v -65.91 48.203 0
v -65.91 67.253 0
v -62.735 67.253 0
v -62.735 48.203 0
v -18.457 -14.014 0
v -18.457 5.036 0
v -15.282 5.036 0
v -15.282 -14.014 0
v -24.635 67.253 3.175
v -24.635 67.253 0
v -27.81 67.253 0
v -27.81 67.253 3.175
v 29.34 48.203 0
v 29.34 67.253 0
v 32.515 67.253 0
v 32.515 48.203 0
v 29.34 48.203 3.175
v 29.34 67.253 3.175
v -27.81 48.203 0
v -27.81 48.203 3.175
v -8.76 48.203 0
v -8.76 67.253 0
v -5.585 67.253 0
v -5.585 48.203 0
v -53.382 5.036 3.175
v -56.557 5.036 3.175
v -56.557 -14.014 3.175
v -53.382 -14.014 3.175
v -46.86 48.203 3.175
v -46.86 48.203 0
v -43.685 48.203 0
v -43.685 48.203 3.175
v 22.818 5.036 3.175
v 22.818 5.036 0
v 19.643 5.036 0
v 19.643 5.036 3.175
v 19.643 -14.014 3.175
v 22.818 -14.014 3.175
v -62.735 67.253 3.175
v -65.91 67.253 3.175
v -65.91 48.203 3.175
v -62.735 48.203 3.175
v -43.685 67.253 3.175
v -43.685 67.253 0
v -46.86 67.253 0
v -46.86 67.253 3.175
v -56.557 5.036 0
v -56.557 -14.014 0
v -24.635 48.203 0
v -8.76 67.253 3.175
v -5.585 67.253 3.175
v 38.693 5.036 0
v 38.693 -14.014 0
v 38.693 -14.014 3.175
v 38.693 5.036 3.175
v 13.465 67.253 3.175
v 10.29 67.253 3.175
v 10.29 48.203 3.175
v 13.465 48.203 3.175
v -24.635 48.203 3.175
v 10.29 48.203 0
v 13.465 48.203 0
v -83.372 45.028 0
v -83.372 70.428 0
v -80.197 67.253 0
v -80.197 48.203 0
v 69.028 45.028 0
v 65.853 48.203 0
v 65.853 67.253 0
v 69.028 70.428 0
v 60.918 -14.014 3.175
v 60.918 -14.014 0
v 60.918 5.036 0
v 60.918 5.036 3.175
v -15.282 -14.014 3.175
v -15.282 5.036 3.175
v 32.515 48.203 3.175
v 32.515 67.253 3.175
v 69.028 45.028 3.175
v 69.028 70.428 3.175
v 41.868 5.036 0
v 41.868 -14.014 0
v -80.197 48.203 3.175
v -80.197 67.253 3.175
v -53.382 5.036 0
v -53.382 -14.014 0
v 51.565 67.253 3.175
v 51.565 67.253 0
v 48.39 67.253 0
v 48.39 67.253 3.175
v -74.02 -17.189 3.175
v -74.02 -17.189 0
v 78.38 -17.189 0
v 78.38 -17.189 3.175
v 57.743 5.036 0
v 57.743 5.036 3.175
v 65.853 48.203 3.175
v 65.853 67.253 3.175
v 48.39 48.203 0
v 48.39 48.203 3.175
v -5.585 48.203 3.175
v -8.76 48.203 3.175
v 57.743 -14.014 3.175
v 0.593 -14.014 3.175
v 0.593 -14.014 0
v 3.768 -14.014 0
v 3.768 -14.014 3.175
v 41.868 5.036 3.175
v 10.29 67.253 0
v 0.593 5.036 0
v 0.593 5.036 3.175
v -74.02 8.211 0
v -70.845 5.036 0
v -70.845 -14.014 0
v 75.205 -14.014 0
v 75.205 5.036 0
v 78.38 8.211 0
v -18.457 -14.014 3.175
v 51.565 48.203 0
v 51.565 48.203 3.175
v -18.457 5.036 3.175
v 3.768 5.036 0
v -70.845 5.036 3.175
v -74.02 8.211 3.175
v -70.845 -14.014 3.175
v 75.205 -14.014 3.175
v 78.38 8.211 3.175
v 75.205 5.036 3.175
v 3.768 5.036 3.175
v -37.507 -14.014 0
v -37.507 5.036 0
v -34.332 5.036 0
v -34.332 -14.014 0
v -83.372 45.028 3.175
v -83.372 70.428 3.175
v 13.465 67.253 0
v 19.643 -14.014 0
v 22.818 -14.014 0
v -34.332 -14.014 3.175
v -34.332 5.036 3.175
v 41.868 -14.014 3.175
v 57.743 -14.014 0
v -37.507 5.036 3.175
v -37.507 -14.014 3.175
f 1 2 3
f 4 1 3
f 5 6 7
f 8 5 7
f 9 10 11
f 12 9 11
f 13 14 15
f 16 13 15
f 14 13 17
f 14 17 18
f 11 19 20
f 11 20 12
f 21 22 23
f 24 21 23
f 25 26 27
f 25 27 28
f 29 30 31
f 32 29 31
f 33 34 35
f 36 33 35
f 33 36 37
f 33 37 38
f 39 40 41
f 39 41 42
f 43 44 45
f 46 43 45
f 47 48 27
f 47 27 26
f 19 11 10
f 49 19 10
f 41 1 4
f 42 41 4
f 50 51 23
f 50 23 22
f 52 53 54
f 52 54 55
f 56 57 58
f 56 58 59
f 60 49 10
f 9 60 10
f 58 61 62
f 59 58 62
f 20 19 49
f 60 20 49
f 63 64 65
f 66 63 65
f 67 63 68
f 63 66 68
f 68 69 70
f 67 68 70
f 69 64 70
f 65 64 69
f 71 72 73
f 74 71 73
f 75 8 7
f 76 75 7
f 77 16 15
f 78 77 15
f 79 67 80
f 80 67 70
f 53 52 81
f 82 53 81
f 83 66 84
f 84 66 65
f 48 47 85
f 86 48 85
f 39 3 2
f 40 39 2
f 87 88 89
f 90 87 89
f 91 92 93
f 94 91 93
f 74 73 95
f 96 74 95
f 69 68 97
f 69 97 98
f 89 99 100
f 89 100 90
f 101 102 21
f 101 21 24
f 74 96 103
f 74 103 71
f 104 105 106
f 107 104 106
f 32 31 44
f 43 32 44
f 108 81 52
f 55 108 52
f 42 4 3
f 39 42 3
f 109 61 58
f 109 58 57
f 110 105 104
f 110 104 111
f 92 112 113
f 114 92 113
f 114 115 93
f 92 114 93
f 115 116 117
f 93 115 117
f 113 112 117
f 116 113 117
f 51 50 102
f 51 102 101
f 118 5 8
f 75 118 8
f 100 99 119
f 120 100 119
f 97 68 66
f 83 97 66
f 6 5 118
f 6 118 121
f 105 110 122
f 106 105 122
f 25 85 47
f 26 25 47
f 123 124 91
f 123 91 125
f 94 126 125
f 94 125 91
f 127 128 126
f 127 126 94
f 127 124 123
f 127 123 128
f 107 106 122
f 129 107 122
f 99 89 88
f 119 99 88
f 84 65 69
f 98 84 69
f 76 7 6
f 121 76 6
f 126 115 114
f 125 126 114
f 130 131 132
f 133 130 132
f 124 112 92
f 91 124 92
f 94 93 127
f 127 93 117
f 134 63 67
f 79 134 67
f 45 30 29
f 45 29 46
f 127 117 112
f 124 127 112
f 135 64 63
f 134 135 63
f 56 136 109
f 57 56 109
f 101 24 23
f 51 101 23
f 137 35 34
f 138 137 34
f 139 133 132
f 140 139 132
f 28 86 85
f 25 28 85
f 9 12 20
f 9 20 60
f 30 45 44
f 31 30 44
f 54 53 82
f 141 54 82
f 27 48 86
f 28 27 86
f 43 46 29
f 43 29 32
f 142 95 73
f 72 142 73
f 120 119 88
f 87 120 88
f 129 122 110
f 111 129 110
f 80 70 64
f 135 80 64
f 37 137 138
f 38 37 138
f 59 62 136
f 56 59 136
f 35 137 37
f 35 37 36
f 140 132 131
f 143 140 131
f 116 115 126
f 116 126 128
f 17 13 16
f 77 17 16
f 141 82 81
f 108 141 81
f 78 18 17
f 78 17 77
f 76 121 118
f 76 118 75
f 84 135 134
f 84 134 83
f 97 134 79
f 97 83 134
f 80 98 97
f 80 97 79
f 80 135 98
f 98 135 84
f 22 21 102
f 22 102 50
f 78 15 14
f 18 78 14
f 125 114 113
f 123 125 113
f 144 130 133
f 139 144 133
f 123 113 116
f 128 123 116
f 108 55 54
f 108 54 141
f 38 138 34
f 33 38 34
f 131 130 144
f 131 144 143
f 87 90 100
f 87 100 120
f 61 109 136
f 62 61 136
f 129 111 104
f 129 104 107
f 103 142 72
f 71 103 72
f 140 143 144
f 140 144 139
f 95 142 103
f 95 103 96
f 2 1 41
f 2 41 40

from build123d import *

# Parameters (mm, degrees)
F0_W     = 3.175
F0_H     = 3.175
F0_W_2   = 14.2875
F0_W_3   = 1.5875
F0_W_4   = 15.875
F0_H_2   = 19.05
F1_DEPTH = 3.175
F2_DEPTH = 3.175


with BuildPart() as f1:
    # F0 (on Top) → F1 (new body)
    with BuildSketch(Plane.XY):
        with Locations((-72.4323269486, 6.6236498341)):
            Rectangle(F0_W, F0_H)
        with Locations((76.7926730514, 6.6236498341)):
            Rectangle(F0_W, F0_H)
        with Locations((-72.4323269486, -15.6013501659)):
            Rectangle(F0_W, F0_H)
        with Locations((76.7926730514, -15.6013501659)):
            Rectangle(F0_W, F0_H)
        with Locations((-63.7010769486, 6.6236498341)):
            Rectangle(F0_W_2, F0_H)
        with Locations((-55.7635769486, 6.6236498341)):
            Rectangle(F0_W_3, F0_H)
        with Locations((-54.1760769486, 6.6236498341)):
            Rectangle(F0_W_3, F0_H)
        with Locations((-45.4448269486, 6.6236498341)):
            Rectangle(F0_W_4, F0_H)
        with Locations((-36.7135769486, 6.6236498341)):
            Rectangle(F0_W_3, F0_H)
        with Locations((-35.1260769486, 6.6236498341)):
            Rectangle(F0_W_3, F0_H)
        with Locations((-26.3948269486, 6.6236498341)):
            Rectangle(F0_W_4, F0_H)
        with Locations((-17.6635769486, 6.6236498341)):
            Rectangle(F0_W_3, F0_H)
        with Locations((-16.0760769486, 6.6236498341)):
            Rectangle(F0_W_3, F0_H)
        with Locations((-7.3448269486, 6.6236498341)):
            Rectangle(F0_W_4, F0_H)
        with Locations((1.3864230514, 6.6236498341)):
            Rectangle(F0_W_3, F0_H)
        with Locations((2.9739230514, 6.6236498341)):
            Rectangle(F0_W_3, F0_H)
        with Locations((11.7051730514, 6.6236498341)):
            Rectangle(F0_W_4, F0_H)
        with Locations((20.4364230514, 6.6236498341)):
            Rectangle(F0_W_3, F0_H)
        with Locations((22.0239230514, 6.6236498341)):
            Rectangle(F0_W_3, F0_H)
        with Locations((30.7551730514, 6.6236498341)):
            Rectangle(F0_W_4, F0_H)
        with Locations((39.4864230514, 6.6236498341)):
            Rectangle(F0_W_3, F0_H)
        with Locations((41.0739230514, 6.6236498341)):
            Rectangle(F0_W_3, F0_H)
        with Locations((49.8051730514, 6.6236498341)):
            Rectangle(F0_W_4, F0_H)
        with Locations((58.5364230514, 6.6236498341)):
            Rectangle(F0_W_3, F0_H)
        with Locations((60.1239230514, 6.6236498341)):
            Rectangle(F0_W_3, F0_H)
        with Locations((68.0614230514, 6.6236498341)):
            Rectangle(F0_W_2, F0_H)
        with Locations((-63.7010769486, -15.6013501659)):
            Rectangle(F0_W_2, F0_H)
        with Locations((-55.7635769486, -15.6013501659)):
            Rectangle(F0_W_3, F0_H)
        with Locations((-54.1760769486, -15.6013501659)):
            Rectangle(F0_W_3, F0_H)
        with Locations((-45.4448269486, -15.6013501659)):
            Rectangle(F0_W_4, F0_H)
        with Locations((-36.7135769486, -15.6013501659)):
            Rectangle(F0_W_3, F0_H)
        with Locations((-35.1260769486, -15.6013501659)):
            Rectangle(F0_W_3, F0_H)
        with Locations((-26.3948269486, -15.6013501659)):
            Rectangle(F0_W_4, F0_H)
        with Locations((-17.6635769486, -15.6013501659)):
            Rectangle(F0_W_3, F0_H)
        with Locations((-16.0760769486, -15.6013501659)):
            Rectangle(F0_W_3, F0_H)
        with Locations((-7.3448269486, -15.6013501659)):
            Rectangle(F0_W_4, F0_H)
        with Locations((1.3864230514, -15.6013501659)):
            Rectangle(F0_W_3, F0_H)
        with Locations((2.9739230514, -15.6013501659)):
            Rectangle(F0_W_3, F0_H)
        with Locations((11.7051730514, -15.6013501659)):
            Rectangle(F0_W_4, F0_H)
        with Locations((20.4364230514, -15.6013501659)):
            Rectangle(F0_W_3, F0_H)
        with Locations((22.0239230514, -15.6013501659)):
            Rectangle(F0_W_3, F0_H)
        with Locations((30.7551730514, -15.6013501659)):
            Rectangle(F0_W_4, F0_H)
        with Locations((39.4864230514, -15.6013501659)):
            Rectangle(F0_W_3, F0_H)
        with Locations((41.0739230514, -15.6013501659)):
            Rectangle(F0_W_3, F0_H)
        with Locations((49.8051730514, -15.6013501659)):
            Rectangle(F0_W_4, F0_H)
        with Locations((58.5364230514, -15.6013501659)):
            Rectangle(F0_W_3, F0_H)
        with Locations((60.1239230514, -15.6013501659)):
            Rectangle(F0_W_3, F0_H)
        with Locations((68.0614230514, -15.6013501659)):
            Rectangle(F0_W_2, F0_H)
        with Locations((-72.4323269486, -4.4888501659)):
            Rectangle(F0_W, F0_H_2)
        with Locations((76.7926730514, -4.4888501659)):
            Rectangle(F0_W, F0_H_2)
    extrude(amount=F1_DEPTH)


with BuildPart() as f1b:
    # F0 (on Top) → F1, piece 2 (new body)
    with BuildSketch(Plane.XY):
        with Locations((67.4402641416, 68.8409235835)):
            Rectangle(F0_W, F0_H)
        with Locations((-81.7847358584, 46.6159235835)):
            Rectangle(F0_W, F0_H)
        with Locations((67.4402641416, 46.6159235835)):
            Rectangle(F0_W, F0_H)
        with Locations((-73.0534858584, 68.8409235835)):
            Rectangle(F0_W_2, F0_H)
        with Locations((-65.1159858584, 68.8409235835)):
            Rectangle(F0_W_3, F0_H)
        with Locations((-63.5284858584, 68.8409235835)):
            Rectangle(F0_W_3, F0_H)
        with Locations((-54.7972358584, 68.8409235835)):
            Rectangle(F0_W_4, F0_H)
        with Locations((-46.0659858584, 68.8409235835)):
            Rectangle(F0_W_3, F0_H)
        with Locations((-44.4784858584, 68.8409235835)):
            Rectangle(F0_W_3, F0_H)
        with Locations((-35.7472358584, 68.8409235835)):
            Rectangle(F0_W_4, F0_H)
        with Locations((-27.0159858584, 68.8409235835)):
            Rectangle(F0_W_3, F0_H)
        with Locations((-25.4284858584, 68.8409235835)):
            Rectangle(F0_W_3, F0_H)
        with Locations((-16.6972358584, 68.8409235835)):
            Rectangle(F0_W_4, F0_H)
        with Locations((-7.9659858584, 68.8409235835)):
            Rectangle(F0_W_3, F0_H)
        with Locations((-6.3784858584, 68.8409235835)):
            Rectangle(F0_W_3, F0_H)
        with Locations((2.3527641416, 68.8409235835)):
            Rectangle(F0_W_4, F0_H)
        with Locations((11.0840141416, 68.8409235835)):
            Rectangle(F0_W_3, F0_H)
        with Locations((12.6715141416, 68.8409235835)):
            Rectangle(F0_W_3, F0_H)
        with Locations((21.4027641416, 68.8409235835)):
            Rectangle(F0_W_4, F0_H)
        with Locations((30.1340141416, 68.8409235835)):
            Rectangle(F0_W_3, F0_H)
        with Locations((31.7215141416, 68.8409235835)):
            Rectangle(F0_W_3, F0_H)
        with Locations((40.4527641416, 68.8409235835)):
            Rectangle(F0_W_4, F0_H)
        with Locations((49.1840141416, 68.8409235835)):
            Rectangle(F0_W_3, F0_H)
        with Locations((50.7715141416, 68.8409235835)):
            Rectangle(F0_W_3, F0_H)
        with Locations((58.7090141416, 68.8409235835)):
            Rectangle(F0_W_2, F0_H)
        with Locations((-73.0534858584, 46.6159235835)):
            Rectangle(F0_W_2, F0_H)
        with Locations((-65.1159858584, 46.6159235835)):
            Rectangle(F0_W_3, F0_H)
        with Locations((-63.5284858584, 46.6159235835)):
            Rectangle(F0_W_3, F0_H)
        with Locations((-54.7972358584, 46.6159235835)):
            Rectangle(F0_W_4, F0_H)
        with Locations((-46.0659858584, 46.6159235835)):
            Rectangle(F0_W_3, F0_H)
        with Locations((-44.4784858584, 46.6159235835)):
            Rectangle(F0_W_3, F0_H)
        with Locations((-35.7472358584, 46.6159235835)):
            Rectangle(F0_W_4, F0_H)
        with Locations((-27.0159858584, 46.6159235835)):
            Rectangle(F0_W_3, F0_H)
        with Locations((-25.4284858584, 46.6159235835)):
            Rectangle(F0_W_3, F0_H)
        with Locations((-16.6972358584, 46.6159235835)):
            Rectangle(F0_W_4, F0_H)
        with Locations((-7.9659858584, 46.6159235835)):
            Rectangle(F0_W_3, F0_H)
        with Locations((-6.3784858584, 46.6159235835)):
            Rectangle(F0_W_3, F0_H)
        with Locations((2.3527641416, 46.6159235835)):
            Rectangle(F0_W_4, F0_H)
        with Locations((11.0840141416, 46.6159235835)):
            Rectangle(F0_W_3, F0_H)
        with Locations((12.6715141416, 46.6159235835)):
            Rectangle(F0_W_3, F0_H)
        with Locations((21.4027641416, 46.6159235835)):
            Rectangle(F0_W_4, F0_H)
        with Locations((30.1340141416, 46.6159235835)):
            Rectangle(F0_W_3, F0_H)
        with Locations((31.7215141416, 46.6159235835)):
            Rectangle(F0_W_3, F0_H)
        with Locations((40.4527641416, 46.6159235835)):
            Rectangle(F0_W_4, F0_H)
        with Locations((49.1840141416, 46.6159235835)):
            Rectangle(F0_W_3, F0_H)
        with Locations((50.7715141416, 46.6159235835)):
            Rectangle(F0_W_3, F0_H)
        with Locations((58.7090141416, 46.6159235835)):
            Rectangle(F0_W_2, F0_H)
        with Locations((-81.7847358584, 57.7284235835)):
            Rectangle(F0_W, F0_H_2)
        with Locations((67.4402641416, 57.7284235835)):
            Rectangle(F0_W, F0_H_2)
        with Locations((-81.7847358584, 68.8409235835)):
            Rectangle(F0_W, F0_H)
    extrude(amount=F1_DEPTH)


with BuildPart() as f2:
    # F0 (on Top) → F2 (new body)
    with BuildSketch(Plane.XY):
        with Locations((-65.1159858584, 57.7284235835)):
            Rectangle(F0_W_3, F0_H_2)
        with Locations((-63.5284858584, 57.7284235835)):
            Rectangle(F0_W_3, F0_H_2)
    extrude(amount=F2_DEPTH)


with BuildPart() as f2b:
    # F0 (on Top) → F2, piece 2 (new body)
    with BuildSketch(Plane.XY):
        with Locations((-46.0659858584, 57.7284235835)):
            Rectangle(F0_W_3, F0_H_2)
        with Locations((-44.4784858584, 57.7284235835)):
            Rectangle(F0_W_3, F0_H_2)
    extrude(amount=F2_DEPTH)


with BuildPart() as f2c:
    # F0 (on Top) → F2, piece 3 (new body)
    with BuildSketch(Plane.XY):
        with Locations((-27.0159858584, 57.7284235835)):
            Rectangle(F0_W_3, F0_H_2)
        with Locations((-25.4284858584, 57.7284235835)):
            Rectangle(F0_W_3, F0_H_2)
    extrude(amount=F2_DEPTH)


with BuildPart() as f2d:
    # F0 (on Top) → F2, piece 4 (new body)
    with BuildSketch(Plane.XY):
        with Locations((-7.9659858584, 57.7284235835)):
            Rectangle(F0_W_3, F0_H_2)
        with Locations((-6.3784858584, 57.7284235835)):
            Rectangle(F0_W_3, F0_H_2)
    extrude(amount=F2_DEPTH)


with BuildPart() as f2e:
    # F0 (on Top) → F2, piece 5 (new body)
    with BuildSketch(Plane.XY):
        with Locations((11.0840141416, 57.7284235835)):
            Rectangle(F0_W_3, F0_H_2)
        with Locations((12.6715141416, 57.7284235835)):
            Rectangle(F0_W_3, F0_H_2)
    extrude(amount=F2_DEPTH)


with BuildPart() as f2f:
    # F0 (on Top) → F2, piece 6 (new body)
    with BuildSketch(Plane.XY):
        with Locations((30.1340141416, 57.7284235835)):
            Rectangle(F0_W_3, F0_H_2)
        with Locations((31.7215141416, 57.7284235835)):
            Rectangle(F0_W_3, F0_H_2)
    extrude(amount=F2_DEPTH)


with BuildPart() as f2g:
    # F0 (on Top) → F2, piece 7 (new body)
    with BuildSketch(Plane.XY):
        with Locations((49.1840141416, 57.7284235835)):
            Rectangle(F0_W_3, F0_H_2)
        with Locations((50.7715141416, 57.7284235835)):
            Rectangle(F0_W_3, F0_H_2)
    extrude(amount=F2_DEPTH)


with BuildPart() as f2h:
    # F0 (on Top) → F2, piece 8 (new body)
    with BuildSketch(Plane.XY):
        with Locations((-55.7635769486, -4.4888501659)):
            Rectangle(F0_W_3, F0_H_2)
        with Locations((-54.1760769486, -4.4888501659)):
            Rectangle(F0_W_3, F0_H_2)
    extrude(amount=F2_DEPTH)


with BuildPart() as f2i:
    # F0 (on Top) → F2, piece 9 (new body)
    with BuildSketch(Plane.XY):
        with Locations((-36.7135769486, -4.4888501659)):
            Rectangle(F0_W_3, F0_H_2)
        with Locations((-35.1260769486, -4.4888501659)):
            Rectangle(F0_W_3, F0_H_2)
    extrude(amount=F2_DEPTH)


with BuildPart() as f2j:
    # F0 (on Top) → F2, piece 10 (new body)
    with BuildSketch(Plane.XY):
        with Locations((-17.6635769486, -4.4888501659)):
            Rectangle(F0_W_3, F0_H_2)
        with Locations((-16.0760769486, -4.4888501659)):
            Rectangle(F0_W_3, F0_H_2)
    extrude(amount=F2_DEPTH)


with BuildPart() as f2k:
    # F0 (on Top) → F2, piece 11 (new body)
    with BuildSketch(Plane.XY):
        with Locations((1.3864230514, -4.4888501659)):
            Rectangle(F0_W_3, F0_H_2)
        with Locations((2.9739230514, -4.4888501659)):
            Rectangle(F0_W_3, F0_H_2)
    extrude(amount=F2_DEPTH)


with BuildPart() as f2l:
    # F0 (on Top) → F2, piece 12 (new body)
    with BuildSketch(Plane.XY):
        with Locations((20.4364230514, -4.4888501659)):
            Rectangle(F0_W_3, F0_H_2)
        with Locations((22.0239230514, -4.4888501659)):
            Rectangle(F0_W_3, F0_H_2)
    extrude(amount=F2_DEPTH)


with BuildPart() as f2m:
    # F0 (on Top) → F2, piece 13 (new body)
    with BuildSketch(Plane.XY):
        with Locations((39.4864230514, -4.4888501659)):
            Rectangle(F0_W_3, F0_H_2)
        with Locations((41.0739230514, -4.4888501659)):
            Rectangle(F0_W_3, F0_H_2)
    extrude(amount=F2_DEPTH)


with BuildPart() as f2n:
    # F0 (on Top) → F2, piece 14 (new body)
    with BuildSketch(Plane.XY):
        with Locations((58.5364230514, -4.4888501659)):
            Rectangle(F0_W_3, F0_H_2)
        with Locations((60.1239230514, -4.4888501659)):
            Rectangle(F0_W_3, F0_H_2)
    extrude(amount=F2_DEPTH)


solid = Compound([f1.part, f1b.part, f2.part, f2b.part, f2c.part, f2d.part, f2e.part, f2f.part, f2g.part, f2h.part, f2i.part, f2j.part, f2k.part, f2l.part, f2m.part, f2n.part])
